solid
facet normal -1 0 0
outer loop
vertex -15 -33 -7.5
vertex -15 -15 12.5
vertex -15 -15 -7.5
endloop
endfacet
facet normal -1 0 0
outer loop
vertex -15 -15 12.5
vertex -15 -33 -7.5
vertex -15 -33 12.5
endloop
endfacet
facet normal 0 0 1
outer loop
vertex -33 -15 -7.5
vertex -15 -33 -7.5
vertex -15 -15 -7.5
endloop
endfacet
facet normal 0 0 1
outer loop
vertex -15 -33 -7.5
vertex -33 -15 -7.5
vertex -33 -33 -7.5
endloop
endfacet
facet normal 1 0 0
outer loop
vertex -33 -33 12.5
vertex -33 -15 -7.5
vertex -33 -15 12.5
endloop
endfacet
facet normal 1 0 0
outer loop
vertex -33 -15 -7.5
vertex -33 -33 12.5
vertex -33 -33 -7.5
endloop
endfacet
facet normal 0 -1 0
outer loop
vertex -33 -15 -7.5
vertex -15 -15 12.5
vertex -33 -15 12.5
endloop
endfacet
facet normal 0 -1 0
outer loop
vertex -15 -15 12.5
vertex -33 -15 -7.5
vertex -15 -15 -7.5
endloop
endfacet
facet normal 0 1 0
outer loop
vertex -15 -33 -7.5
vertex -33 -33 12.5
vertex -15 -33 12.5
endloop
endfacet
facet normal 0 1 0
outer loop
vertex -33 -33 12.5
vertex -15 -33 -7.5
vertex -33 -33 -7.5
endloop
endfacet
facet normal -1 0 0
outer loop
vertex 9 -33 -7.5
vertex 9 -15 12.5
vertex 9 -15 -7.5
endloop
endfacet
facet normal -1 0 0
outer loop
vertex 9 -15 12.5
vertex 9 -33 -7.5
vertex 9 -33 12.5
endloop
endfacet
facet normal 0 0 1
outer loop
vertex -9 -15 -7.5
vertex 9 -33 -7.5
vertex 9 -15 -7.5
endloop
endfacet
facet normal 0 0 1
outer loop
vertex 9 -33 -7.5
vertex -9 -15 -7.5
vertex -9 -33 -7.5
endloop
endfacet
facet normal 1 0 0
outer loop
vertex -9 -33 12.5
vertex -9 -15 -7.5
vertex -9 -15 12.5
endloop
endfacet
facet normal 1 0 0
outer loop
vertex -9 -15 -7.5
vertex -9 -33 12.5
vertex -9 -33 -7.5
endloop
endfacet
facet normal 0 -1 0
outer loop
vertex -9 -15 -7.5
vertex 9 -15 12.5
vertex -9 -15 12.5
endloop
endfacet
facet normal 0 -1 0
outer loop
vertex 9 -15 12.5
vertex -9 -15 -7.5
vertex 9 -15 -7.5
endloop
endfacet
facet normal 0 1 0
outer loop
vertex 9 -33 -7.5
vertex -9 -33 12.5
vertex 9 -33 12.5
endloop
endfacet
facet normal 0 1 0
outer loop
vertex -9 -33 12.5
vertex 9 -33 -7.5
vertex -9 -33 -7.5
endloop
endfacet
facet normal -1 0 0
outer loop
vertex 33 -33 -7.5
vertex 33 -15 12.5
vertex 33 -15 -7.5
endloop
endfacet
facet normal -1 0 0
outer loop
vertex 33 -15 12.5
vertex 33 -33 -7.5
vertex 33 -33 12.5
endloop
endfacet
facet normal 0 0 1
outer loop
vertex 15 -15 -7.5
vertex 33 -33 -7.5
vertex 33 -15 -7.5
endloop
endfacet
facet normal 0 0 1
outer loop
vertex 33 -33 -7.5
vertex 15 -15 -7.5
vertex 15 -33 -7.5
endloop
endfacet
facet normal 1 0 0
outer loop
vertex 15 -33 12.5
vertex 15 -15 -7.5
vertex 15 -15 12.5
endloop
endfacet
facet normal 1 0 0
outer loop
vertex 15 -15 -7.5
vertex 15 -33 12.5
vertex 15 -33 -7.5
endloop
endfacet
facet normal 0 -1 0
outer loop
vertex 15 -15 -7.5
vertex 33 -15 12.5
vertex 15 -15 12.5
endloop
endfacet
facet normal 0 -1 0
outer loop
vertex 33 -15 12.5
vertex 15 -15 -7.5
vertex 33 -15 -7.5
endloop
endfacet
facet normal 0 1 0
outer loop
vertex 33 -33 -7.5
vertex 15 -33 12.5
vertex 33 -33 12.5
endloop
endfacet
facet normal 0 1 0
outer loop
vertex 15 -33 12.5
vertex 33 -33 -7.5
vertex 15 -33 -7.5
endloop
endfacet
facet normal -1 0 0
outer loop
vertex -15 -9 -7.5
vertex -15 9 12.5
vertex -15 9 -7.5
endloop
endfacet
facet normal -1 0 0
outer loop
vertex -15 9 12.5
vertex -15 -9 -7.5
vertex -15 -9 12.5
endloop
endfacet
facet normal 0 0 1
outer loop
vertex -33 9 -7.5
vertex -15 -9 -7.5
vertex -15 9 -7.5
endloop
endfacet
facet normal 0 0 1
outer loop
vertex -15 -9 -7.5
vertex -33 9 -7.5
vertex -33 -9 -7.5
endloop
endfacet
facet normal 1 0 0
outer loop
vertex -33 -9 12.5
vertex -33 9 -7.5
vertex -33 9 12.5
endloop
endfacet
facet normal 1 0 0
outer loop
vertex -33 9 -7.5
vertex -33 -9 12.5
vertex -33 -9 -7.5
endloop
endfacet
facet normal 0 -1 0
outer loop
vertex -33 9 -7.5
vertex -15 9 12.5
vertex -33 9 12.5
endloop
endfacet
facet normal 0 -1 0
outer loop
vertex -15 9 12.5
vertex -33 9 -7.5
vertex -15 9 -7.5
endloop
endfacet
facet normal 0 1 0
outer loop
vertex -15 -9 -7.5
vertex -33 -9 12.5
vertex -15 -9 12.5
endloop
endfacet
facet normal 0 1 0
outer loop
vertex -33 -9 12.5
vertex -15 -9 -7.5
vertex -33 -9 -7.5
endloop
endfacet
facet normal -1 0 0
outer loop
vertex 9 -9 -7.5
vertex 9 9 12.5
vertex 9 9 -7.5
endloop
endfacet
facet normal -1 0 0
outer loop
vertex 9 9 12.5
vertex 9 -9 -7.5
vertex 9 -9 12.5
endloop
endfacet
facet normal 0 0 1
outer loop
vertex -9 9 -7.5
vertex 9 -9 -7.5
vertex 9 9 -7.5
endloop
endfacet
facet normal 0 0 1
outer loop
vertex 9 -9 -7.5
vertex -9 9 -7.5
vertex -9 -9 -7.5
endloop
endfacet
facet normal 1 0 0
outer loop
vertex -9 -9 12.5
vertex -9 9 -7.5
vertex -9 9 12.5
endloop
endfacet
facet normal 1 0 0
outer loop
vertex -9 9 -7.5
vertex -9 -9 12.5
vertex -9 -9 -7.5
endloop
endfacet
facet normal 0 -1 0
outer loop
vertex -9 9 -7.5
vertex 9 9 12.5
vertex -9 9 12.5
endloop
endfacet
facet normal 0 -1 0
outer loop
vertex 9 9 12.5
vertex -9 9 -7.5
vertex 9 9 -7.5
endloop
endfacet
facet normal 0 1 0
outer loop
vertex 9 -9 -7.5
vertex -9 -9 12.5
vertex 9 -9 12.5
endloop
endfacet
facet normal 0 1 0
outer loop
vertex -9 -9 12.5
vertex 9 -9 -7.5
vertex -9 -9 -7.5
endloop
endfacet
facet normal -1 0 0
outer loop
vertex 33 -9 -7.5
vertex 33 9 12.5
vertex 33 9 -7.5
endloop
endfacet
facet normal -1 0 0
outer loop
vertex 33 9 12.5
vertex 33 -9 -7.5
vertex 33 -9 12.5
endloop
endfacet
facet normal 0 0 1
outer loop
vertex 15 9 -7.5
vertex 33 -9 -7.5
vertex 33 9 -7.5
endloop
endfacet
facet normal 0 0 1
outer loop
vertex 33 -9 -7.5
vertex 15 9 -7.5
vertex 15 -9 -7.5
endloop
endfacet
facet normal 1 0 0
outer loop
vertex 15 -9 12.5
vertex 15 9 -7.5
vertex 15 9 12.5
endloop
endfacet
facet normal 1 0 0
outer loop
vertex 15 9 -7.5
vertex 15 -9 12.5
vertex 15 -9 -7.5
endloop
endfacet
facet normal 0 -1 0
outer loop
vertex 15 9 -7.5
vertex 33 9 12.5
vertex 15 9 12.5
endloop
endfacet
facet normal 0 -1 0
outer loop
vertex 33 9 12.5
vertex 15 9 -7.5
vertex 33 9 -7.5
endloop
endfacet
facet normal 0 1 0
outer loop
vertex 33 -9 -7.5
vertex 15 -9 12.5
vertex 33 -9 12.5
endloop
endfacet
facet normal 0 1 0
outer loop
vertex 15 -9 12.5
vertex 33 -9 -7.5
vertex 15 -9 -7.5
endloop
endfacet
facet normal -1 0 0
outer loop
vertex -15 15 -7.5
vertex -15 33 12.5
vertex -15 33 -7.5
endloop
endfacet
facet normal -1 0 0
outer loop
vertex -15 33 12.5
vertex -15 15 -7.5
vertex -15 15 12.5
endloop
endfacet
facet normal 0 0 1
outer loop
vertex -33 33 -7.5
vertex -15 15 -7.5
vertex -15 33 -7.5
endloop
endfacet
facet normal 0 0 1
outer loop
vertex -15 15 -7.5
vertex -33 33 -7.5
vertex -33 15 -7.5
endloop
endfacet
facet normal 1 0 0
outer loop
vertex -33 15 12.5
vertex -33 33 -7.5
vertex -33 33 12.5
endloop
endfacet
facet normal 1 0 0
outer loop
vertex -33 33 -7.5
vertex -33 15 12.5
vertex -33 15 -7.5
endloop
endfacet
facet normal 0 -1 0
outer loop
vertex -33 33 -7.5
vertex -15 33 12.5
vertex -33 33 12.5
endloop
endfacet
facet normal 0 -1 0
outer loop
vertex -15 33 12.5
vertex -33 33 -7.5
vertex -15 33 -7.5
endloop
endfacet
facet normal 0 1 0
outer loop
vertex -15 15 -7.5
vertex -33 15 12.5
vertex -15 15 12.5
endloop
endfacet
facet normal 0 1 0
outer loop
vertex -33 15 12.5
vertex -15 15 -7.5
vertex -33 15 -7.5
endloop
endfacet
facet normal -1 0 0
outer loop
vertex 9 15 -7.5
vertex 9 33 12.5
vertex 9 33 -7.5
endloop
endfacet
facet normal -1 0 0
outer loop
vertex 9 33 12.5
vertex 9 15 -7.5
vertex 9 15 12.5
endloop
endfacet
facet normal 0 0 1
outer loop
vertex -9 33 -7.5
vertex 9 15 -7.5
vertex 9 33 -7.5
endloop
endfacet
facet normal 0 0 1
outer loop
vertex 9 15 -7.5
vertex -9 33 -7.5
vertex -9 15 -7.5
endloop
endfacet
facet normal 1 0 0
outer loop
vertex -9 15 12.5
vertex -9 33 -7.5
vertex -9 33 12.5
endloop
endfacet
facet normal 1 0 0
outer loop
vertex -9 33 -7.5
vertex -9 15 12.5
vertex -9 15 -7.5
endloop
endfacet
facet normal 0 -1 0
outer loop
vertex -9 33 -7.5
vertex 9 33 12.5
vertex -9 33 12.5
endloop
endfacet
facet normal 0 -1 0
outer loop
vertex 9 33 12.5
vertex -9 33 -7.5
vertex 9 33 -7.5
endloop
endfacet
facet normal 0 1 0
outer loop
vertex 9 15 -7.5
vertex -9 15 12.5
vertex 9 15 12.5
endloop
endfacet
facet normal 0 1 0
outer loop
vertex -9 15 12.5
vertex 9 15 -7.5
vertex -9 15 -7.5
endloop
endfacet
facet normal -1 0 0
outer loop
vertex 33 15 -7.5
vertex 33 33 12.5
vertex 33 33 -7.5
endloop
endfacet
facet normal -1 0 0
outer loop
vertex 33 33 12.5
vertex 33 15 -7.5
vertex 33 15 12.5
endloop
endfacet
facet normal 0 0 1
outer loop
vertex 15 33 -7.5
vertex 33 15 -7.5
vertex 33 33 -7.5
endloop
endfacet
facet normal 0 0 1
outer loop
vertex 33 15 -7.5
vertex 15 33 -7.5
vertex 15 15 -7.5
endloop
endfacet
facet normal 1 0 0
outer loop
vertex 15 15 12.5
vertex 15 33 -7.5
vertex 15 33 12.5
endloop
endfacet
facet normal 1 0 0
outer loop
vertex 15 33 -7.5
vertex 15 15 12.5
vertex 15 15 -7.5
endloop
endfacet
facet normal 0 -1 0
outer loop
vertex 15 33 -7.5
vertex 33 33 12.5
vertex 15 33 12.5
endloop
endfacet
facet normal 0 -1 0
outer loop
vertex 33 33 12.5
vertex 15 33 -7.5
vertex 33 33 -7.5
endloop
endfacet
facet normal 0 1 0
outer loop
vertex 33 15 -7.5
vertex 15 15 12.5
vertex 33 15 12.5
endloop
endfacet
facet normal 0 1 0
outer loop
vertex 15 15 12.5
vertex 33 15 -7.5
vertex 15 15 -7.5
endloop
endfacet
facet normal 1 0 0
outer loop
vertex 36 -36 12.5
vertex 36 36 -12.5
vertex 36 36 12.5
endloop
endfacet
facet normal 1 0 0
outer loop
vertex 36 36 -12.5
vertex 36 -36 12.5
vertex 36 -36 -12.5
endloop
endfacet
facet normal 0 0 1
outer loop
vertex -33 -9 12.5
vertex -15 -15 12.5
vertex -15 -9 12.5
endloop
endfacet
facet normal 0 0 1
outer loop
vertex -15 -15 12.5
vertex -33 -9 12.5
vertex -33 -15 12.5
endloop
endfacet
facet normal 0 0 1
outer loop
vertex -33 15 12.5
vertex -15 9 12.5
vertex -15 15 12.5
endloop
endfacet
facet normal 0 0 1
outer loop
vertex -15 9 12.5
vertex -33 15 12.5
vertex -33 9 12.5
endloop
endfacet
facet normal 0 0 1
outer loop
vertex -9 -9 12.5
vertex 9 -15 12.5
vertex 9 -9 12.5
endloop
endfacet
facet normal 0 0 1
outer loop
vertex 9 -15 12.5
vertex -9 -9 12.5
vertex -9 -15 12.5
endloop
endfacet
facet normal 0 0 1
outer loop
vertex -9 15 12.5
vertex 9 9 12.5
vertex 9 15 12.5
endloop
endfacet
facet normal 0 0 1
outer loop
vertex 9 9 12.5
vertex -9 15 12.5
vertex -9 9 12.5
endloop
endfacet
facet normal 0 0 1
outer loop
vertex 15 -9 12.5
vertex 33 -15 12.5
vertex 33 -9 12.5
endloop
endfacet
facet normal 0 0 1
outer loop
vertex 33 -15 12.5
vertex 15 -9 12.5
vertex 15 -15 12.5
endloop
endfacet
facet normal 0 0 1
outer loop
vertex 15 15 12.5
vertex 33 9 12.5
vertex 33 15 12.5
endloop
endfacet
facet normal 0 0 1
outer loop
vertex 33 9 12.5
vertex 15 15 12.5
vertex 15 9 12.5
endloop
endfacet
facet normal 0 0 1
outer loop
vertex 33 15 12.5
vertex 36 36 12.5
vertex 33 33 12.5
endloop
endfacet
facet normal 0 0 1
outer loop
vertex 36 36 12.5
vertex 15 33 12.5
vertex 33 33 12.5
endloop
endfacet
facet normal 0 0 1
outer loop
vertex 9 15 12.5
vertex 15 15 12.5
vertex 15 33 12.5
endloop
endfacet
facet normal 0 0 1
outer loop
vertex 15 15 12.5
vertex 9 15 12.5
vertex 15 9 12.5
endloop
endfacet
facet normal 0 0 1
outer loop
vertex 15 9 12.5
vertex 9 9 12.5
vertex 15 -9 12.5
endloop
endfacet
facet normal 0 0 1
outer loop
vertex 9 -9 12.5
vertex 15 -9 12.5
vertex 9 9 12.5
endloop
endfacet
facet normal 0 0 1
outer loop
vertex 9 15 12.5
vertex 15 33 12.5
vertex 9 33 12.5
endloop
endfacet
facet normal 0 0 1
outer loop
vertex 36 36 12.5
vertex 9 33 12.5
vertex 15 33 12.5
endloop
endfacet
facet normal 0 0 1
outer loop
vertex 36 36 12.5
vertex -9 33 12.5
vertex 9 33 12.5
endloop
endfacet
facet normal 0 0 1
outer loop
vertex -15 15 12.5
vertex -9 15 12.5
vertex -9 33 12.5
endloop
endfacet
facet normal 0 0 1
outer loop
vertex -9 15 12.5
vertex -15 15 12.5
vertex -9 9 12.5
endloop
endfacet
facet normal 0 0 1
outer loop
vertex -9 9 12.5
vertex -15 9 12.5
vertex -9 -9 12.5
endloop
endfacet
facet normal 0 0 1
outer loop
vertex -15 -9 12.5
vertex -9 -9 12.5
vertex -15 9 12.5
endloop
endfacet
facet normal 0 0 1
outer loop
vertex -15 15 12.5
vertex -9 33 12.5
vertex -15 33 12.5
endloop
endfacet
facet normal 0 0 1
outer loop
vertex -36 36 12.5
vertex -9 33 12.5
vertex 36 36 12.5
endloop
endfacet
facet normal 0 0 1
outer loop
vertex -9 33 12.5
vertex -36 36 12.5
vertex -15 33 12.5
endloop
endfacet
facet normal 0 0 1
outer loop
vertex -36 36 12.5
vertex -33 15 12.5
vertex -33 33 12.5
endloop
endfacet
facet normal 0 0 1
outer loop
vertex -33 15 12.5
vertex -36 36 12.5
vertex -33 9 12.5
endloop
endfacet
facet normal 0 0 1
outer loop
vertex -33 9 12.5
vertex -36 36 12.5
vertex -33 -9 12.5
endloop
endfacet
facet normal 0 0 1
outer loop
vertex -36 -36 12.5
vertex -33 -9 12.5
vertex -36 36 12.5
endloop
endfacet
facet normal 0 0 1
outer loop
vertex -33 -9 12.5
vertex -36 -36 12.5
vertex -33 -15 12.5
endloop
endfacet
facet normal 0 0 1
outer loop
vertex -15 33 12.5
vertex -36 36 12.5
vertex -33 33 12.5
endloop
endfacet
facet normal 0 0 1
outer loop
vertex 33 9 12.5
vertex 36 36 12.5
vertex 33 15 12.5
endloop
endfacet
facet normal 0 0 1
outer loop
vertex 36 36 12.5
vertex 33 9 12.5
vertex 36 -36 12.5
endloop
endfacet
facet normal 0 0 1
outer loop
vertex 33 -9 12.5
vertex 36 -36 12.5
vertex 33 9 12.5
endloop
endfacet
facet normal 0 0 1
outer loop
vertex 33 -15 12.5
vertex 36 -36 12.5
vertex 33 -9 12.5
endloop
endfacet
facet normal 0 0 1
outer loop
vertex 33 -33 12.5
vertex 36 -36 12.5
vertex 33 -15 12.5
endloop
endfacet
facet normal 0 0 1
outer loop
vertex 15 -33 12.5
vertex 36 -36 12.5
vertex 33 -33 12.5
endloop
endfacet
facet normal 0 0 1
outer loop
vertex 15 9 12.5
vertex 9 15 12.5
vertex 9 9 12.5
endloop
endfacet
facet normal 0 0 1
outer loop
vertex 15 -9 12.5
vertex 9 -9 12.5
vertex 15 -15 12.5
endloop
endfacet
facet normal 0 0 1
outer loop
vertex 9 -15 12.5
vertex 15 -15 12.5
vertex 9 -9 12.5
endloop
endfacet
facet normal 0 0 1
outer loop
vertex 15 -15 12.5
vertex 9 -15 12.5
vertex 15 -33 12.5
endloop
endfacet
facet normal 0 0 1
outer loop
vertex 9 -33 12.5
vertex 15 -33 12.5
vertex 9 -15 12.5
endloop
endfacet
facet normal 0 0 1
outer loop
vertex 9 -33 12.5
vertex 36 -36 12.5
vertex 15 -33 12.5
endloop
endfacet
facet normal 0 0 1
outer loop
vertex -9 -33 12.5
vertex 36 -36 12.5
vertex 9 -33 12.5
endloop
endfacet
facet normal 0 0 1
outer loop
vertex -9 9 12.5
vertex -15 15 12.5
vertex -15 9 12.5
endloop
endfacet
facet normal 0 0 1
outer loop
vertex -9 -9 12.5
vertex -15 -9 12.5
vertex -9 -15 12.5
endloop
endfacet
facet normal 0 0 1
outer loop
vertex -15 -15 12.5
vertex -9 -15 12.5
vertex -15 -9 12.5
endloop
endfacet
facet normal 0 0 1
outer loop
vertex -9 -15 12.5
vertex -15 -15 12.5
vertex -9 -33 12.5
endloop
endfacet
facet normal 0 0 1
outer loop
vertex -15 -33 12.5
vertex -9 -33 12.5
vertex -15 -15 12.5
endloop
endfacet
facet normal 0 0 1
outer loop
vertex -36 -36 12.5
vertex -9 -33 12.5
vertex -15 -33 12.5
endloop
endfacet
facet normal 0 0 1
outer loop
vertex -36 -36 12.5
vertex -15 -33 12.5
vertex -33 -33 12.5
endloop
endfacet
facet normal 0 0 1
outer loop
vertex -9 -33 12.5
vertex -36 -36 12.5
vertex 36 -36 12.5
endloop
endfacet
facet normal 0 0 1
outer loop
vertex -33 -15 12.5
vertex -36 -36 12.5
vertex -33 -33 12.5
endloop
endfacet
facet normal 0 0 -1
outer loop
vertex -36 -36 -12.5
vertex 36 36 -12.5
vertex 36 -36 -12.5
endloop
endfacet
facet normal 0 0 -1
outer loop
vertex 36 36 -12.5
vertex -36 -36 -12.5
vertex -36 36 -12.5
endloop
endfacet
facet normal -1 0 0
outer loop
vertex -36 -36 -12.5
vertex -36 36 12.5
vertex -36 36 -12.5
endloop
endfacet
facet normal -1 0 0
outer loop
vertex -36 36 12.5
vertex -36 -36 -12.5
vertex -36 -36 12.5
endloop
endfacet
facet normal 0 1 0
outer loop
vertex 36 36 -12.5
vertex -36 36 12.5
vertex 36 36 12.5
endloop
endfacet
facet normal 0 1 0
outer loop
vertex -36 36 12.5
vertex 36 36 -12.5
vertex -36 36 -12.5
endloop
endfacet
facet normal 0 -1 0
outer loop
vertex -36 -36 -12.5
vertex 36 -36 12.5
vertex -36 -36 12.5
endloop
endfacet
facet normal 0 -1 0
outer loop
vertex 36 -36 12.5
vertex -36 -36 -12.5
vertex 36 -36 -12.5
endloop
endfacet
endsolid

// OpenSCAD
$fn = 32;

// ----------------------------------------------------------------------
// Pocket plate 72 x 72 x 25
// 3 x 3 pockets 18 mm square, 20 mm deep
// ----------------------------------------------------------------------

// --- parameters (mm) ---
thickness = 25;  // plate thickness
floor_t = 5;     // material left under each pocket
pocket = 18;     // pocket side length
pitch_x = 24;    // pocket pitch along X
pitch_y = 24;    // pocket pitch along Y
cols = 3;        // pockets per row
rows = 3;        // rows of pockets

// --- derived feature positions (mm) ---
depth = thickness - floor_t;        // = 20   pocket depth, down to the floor
span_x = (cols - 1) * pitch_x;      // = 48   distance between outer pockets
span_y = (rows - 1) * pitch_y;      // = 48   distance between outer pocket rows
origin_x = -span_x / 2;             // = -24   X of the first pocket
origin_y = -span_y / 2;             // = -24   Y of the first pocket
plate = [span_x + pocket + 6, span_y + pocket + 6, thickness];  // = [72, 72, 25]   overall size: pockets plus 3 mm of wall on each side
feature_centers = [
  [origin_x + 0 * pitch_x, origin_y + 0 * pitch_y],
  [origin_x + 1 * pitch_x, origin_y + 0 * pitch_y],
  [origin_x + 2 * pitch_x, origin_y + 0 * pitch_y],
  [origin_x + 0 * pitch_x, origin_y + 1 * pitch_y],
  [origin_x + 1 * pitch_x, origin_y + 1 * pitch_y],
  [origin_x + 2 * pitch_x, origin_y + 1 * pitch_y],
  [origin_x + 0 * pitch_x, origin_y + 2 * pitch_y],
  [origin_x + 1 * pitch_x, origin_y + 2 * pitch_y],
  [origin_x + 2 * pitch_x, origin_y + 2 * pitch_y]
];   // pocket centres, used verbatim by the cutter loop

// plate outline, then one pocket per centre in feature_centers
difference() {
  cube(plate, center = true);
  for (centre = feature_centers)
    translate([centre[0] - pocket / 2, centre[1] - pocket / 2, plate[2] / 2 - depth])
      cube([pocket, pocket, depth + 1]);  // centred on the declared pocket centre
}
